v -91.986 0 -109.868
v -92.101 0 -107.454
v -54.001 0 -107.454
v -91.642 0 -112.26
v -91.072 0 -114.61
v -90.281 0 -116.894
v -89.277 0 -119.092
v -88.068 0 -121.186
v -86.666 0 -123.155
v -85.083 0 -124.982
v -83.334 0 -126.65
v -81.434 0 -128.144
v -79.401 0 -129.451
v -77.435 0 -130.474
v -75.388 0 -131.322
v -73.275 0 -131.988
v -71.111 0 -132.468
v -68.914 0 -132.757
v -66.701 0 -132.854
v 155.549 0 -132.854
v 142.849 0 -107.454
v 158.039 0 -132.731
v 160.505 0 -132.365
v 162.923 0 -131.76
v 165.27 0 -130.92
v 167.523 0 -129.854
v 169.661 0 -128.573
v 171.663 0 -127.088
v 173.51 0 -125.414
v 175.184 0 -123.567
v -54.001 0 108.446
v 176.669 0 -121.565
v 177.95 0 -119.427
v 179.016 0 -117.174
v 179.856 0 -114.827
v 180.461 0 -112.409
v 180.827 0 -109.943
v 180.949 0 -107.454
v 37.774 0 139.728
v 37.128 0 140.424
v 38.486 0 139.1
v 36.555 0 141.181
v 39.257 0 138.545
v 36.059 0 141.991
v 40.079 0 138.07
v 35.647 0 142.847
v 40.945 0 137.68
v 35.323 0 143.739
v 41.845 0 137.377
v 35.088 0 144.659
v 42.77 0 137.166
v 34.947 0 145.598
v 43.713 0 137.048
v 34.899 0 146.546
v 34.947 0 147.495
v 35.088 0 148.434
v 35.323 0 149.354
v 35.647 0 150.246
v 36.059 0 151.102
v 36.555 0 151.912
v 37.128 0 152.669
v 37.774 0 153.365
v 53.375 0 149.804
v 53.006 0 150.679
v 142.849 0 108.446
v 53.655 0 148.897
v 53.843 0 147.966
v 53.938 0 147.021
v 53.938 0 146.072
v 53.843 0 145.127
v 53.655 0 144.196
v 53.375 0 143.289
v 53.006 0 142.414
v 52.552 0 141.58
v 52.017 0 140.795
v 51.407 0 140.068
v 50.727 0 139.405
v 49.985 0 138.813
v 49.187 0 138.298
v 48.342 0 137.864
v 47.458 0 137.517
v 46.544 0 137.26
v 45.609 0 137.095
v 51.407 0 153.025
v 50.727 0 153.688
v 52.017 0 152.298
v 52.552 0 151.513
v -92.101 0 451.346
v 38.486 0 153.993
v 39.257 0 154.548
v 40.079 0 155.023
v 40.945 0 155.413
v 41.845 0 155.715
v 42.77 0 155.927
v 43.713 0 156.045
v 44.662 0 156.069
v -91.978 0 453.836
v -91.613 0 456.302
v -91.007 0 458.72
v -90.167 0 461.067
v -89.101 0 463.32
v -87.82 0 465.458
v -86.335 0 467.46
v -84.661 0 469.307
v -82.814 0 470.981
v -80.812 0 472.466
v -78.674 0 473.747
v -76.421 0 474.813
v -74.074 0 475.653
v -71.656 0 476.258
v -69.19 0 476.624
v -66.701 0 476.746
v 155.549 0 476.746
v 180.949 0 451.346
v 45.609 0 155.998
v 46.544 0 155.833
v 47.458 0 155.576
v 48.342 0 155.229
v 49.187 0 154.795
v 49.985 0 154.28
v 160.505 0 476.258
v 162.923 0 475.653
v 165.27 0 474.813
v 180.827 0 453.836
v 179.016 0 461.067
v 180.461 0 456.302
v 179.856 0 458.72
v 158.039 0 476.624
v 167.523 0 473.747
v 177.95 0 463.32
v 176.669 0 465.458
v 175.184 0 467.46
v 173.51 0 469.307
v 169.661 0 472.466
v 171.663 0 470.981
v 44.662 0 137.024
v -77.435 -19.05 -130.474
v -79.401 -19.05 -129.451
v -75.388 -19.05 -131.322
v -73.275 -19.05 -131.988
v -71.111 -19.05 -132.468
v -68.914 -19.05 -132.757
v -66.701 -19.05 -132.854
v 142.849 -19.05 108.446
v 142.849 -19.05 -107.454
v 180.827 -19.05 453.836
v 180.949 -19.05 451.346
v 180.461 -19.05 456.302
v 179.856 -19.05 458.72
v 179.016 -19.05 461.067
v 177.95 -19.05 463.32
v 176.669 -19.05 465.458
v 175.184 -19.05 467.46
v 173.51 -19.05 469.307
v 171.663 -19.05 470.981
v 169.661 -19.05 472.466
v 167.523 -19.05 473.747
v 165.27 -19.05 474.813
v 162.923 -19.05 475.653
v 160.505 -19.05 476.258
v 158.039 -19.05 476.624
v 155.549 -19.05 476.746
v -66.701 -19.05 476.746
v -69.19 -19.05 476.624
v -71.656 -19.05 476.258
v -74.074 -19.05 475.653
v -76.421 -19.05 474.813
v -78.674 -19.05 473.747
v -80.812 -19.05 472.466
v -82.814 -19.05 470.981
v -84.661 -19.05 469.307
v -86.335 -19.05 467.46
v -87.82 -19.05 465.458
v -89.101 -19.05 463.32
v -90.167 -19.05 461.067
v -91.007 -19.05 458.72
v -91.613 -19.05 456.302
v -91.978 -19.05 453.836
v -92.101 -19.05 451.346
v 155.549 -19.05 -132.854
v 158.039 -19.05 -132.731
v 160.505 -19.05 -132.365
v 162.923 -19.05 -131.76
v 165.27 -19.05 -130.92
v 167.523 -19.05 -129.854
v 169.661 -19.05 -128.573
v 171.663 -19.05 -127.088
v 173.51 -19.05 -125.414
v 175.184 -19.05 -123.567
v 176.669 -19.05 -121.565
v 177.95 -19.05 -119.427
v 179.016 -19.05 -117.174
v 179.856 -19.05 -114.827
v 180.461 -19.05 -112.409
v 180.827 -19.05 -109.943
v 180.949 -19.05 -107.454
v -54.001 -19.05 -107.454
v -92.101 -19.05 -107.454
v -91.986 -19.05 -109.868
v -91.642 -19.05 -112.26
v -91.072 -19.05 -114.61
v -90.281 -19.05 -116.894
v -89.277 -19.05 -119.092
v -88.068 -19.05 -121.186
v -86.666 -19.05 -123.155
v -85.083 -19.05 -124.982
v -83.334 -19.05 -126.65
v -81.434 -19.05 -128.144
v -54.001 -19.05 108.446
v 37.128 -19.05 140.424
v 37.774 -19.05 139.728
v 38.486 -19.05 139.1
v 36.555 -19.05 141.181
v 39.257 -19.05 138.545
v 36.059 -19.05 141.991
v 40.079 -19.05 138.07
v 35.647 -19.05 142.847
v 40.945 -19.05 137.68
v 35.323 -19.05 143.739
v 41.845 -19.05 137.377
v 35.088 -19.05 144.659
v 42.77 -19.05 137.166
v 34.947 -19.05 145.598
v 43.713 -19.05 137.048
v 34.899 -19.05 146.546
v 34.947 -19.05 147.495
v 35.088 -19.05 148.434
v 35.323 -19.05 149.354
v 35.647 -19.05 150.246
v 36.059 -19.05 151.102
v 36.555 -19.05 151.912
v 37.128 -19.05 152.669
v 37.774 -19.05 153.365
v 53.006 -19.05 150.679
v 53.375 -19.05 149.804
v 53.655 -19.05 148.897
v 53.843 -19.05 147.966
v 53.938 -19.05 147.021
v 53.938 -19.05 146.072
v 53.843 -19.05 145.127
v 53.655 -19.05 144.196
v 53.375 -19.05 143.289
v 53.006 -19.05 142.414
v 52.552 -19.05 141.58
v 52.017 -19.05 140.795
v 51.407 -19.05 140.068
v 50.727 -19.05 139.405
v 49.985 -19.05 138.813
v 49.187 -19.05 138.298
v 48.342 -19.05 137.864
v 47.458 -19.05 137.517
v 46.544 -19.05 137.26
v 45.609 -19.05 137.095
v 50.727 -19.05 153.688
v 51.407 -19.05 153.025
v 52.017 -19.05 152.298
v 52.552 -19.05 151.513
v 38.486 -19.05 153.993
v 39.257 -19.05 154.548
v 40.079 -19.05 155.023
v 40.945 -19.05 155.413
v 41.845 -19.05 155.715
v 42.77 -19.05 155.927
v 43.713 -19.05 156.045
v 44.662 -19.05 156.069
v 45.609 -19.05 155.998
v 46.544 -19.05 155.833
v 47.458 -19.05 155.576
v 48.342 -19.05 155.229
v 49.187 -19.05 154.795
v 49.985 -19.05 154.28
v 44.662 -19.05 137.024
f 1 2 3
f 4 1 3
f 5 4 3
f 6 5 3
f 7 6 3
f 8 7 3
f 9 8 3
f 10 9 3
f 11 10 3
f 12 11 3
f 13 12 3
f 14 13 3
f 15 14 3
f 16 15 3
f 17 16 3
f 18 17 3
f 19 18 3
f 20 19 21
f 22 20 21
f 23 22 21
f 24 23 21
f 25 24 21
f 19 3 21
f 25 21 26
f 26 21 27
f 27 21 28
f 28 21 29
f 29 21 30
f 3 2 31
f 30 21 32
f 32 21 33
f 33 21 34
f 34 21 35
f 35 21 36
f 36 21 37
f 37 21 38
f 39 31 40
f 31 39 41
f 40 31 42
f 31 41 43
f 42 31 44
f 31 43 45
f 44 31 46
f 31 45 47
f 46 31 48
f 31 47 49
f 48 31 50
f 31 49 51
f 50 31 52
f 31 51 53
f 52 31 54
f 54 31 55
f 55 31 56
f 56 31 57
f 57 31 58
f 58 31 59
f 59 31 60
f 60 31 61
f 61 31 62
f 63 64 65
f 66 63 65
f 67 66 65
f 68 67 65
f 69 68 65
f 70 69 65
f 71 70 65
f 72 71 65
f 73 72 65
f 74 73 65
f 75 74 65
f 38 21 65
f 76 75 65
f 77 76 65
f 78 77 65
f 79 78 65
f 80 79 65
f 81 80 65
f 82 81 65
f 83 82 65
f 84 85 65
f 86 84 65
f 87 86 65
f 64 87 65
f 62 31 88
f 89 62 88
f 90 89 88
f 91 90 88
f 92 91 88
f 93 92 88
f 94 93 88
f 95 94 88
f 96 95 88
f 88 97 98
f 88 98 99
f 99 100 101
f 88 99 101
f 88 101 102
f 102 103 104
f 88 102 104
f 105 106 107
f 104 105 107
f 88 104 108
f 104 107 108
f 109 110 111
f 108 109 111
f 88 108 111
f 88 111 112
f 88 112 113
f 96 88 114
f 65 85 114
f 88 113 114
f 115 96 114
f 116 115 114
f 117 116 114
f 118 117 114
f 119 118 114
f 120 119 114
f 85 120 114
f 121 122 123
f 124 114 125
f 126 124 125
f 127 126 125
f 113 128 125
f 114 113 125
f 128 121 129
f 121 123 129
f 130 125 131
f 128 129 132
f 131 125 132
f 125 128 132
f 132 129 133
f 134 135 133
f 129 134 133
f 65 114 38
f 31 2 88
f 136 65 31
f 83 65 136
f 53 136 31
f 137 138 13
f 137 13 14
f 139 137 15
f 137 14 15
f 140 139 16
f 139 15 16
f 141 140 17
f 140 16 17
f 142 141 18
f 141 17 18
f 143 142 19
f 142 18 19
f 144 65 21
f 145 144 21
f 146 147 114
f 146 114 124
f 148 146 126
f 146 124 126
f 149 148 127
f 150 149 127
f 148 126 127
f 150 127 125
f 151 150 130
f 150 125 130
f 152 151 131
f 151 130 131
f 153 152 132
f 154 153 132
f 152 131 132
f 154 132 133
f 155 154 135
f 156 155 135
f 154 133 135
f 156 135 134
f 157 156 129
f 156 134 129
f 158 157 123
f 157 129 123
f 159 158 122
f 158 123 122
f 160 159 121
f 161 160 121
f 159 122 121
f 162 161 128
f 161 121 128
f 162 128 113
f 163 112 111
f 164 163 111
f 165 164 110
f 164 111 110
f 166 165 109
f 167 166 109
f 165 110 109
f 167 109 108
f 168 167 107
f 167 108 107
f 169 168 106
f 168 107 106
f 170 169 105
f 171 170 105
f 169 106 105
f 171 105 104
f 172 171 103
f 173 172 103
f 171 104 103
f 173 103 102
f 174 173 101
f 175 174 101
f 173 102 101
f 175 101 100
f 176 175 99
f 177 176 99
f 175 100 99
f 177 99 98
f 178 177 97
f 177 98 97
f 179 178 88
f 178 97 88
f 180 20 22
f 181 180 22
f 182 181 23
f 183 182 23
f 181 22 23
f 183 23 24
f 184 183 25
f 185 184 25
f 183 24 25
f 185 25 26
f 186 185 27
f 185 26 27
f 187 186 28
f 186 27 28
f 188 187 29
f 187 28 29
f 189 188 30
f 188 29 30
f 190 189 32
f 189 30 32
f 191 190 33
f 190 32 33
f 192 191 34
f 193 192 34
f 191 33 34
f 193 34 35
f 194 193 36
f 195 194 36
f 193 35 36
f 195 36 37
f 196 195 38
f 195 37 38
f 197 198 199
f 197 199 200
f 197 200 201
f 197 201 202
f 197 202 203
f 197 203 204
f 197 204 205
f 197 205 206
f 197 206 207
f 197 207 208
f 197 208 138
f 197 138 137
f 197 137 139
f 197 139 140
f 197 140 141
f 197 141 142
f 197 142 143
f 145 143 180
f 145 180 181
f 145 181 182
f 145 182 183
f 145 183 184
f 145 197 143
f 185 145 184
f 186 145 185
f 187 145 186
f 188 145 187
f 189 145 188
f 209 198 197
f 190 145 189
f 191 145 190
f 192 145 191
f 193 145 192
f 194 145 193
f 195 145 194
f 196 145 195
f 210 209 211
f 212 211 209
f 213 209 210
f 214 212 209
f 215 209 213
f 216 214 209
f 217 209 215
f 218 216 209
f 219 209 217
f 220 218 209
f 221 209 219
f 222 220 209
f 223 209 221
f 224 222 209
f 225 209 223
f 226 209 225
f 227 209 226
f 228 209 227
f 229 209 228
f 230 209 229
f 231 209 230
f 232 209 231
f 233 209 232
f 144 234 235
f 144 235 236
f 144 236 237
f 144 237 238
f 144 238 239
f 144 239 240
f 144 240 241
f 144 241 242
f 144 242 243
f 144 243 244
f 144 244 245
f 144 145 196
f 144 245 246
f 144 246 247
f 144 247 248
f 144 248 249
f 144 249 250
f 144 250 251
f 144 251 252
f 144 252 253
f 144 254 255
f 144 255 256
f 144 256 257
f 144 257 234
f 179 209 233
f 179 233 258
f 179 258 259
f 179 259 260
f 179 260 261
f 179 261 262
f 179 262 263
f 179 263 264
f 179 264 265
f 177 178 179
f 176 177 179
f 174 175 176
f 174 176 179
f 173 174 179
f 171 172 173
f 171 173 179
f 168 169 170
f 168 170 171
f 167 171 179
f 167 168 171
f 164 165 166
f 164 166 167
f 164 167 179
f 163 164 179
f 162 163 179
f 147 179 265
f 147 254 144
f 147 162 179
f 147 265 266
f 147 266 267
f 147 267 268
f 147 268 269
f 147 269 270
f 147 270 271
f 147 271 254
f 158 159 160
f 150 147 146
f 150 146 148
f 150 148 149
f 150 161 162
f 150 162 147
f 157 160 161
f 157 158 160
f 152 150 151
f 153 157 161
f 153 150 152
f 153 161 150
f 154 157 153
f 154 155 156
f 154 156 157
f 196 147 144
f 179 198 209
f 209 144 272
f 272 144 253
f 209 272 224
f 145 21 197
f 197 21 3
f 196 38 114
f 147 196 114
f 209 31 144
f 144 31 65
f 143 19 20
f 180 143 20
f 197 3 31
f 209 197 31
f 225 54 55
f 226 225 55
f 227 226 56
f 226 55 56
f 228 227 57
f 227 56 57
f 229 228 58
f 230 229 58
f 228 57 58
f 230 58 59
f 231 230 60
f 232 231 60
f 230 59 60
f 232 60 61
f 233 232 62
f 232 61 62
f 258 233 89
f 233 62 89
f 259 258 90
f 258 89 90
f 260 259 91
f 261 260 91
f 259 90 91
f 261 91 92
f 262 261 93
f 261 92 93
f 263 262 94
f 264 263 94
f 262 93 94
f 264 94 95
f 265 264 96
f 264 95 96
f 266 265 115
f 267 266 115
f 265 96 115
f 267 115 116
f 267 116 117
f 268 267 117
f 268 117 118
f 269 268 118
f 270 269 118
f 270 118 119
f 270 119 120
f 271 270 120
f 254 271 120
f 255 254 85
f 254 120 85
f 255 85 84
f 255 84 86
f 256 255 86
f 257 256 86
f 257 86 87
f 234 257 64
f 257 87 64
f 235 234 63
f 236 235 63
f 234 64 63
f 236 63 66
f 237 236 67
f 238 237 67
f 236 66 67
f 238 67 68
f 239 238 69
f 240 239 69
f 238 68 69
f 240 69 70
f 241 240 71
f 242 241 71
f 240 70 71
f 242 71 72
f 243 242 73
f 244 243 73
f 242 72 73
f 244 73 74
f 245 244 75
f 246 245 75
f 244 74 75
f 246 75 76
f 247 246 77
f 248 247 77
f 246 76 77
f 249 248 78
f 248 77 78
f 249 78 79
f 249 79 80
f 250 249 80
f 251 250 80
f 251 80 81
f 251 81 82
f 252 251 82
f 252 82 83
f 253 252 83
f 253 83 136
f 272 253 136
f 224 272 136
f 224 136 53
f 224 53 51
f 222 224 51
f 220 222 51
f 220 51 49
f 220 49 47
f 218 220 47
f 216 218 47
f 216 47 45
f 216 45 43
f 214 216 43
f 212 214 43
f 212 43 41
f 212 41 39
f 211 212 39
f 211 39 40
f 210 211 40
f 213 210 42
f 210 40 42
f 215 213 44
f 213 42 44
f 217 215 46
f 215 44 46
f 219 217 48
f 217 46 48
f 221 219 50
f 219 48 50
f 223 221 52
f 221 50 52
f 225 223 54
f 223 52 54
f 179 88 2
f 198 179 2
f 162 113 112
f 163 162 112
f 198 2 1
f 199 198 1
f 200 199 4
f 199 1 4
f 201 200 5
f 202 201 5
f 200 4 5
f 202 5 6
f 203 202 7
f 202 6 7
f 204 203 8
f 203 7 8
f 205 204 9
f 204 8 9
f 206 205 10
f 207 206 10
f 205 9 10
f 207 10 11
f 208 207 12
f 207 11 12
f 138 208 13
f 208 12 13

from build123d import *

# Parameters (mm, degrees)
F0_W     = 25.4
F0_H     = 163.656833449
F0_W_2   = 136.525
F0_H_2   = 46.7590987682
F1_DEPTH = 19.05


with BuildPart() as f1:
    # F0 (on Front) → F1 (new body)
    with BuildSketch(Plane.XZ):
        with Locations((-79.4005683911, 253.7749098346)):
            Rectangle(F0_W, F0_H)
        Polygon((-66.7005683911, 171.9464931101), (-92.1005683911, 171.9464931101), (-92.1005683911, 146.5464931101), (-79.4005683911, 146.5464931101), (-79.4005683911, -12.6218702644), (-54.0005683911, -12.6218702644), (-54.0005683911, 108.4464931101), (142.8494316089, 108.4464931101), (142.8494316089, -107.4535068899), (180.9494316089, -107.4535068899), (180.9494316089, 171.9464931101), (180.9494316089, 288.8442277908), (44.4244316089, 288.8442277908), (44.4244316089, 335.6033265591), (-66.7005683911, 335.6033265591), align=None)
        with BuildLine():
            ThreePointArc((53.9494316089, 146.5464931101), (44.4244316089, 137.0214931101), (34.8994316089, 146.5464931101))
            ThreePointArc((34.8994316089, 146.5464931101), (44.4244316089, 156.0714931101), (53.9494316089, 146.5464931101))
        make_face(mode=Mode.SUBTRACT)
        Polygon((-79.4005683911, 146.5464931101), (-92.1005683911, 146.5464931101), (-92.1005683911, 121.1464931101), (-92.1005683911, -12.6218702644), (-79.4005683911, -12.6218702644), align=None)
        with BuildLine():
            Line((-92.1005683911, 451.3464931101), (-92.1005683911, 335.6033265591))
            Line((-92.1005683911, 335.6033265591), (-66.7005683911, 335.6033265591))
            Line((-66.7005683911, 335.6033265591), (44.4244316089, 335.6033265591))
            Line((44.4244316089, 335.6033265591), (180.9494316089, 335.6033265591))
            Line((180.9494316089, 335.6033265591), (180.9494316089, 451.3464931101))
            ThreePointArc((180.9494316089, 451.3464931101), (173.509943851, 469.3070053522), (155.5494316089, 476.7464931101))
            Line((155.5494316089, 476.7464931101), (-66.7005683911, 476.7464931101))
            ThreePointArc((-66.7005683911, 476.7464931101), (-84.6610806333, 469.3070053522), (-92.1005683911, 451.3464931101))
        make_face()
        with Locations((112.6869316089, 312.2237771749)):
            Rectangle(F0_W_2, F0_H_2)
        with BuildLine():
            Line((-79.4005683911, -12.6218702644), (-92.1005683911, -12.6218702644))
            Line((-92.1005683911, -12.6218702644), (-92.1005683911, -107.4535068899))
            ThreePointArc((-92.1005683911, -107.4535068899), (-88.6976136472, -120.1535068899), (-79.4005683911, -129.4505521461))
            Line((-79.4005683911, -129.4505521461), (-79.4005683911, -12.6218702644))
        make_face()
        with BuildLine():
            Line((-54.0005683911, -12.6218702644), (-79.4005683911, -12.6218702644))
            Line((-79.4005683911, -12.6218702644), (-79.4005683911, -129.4505521461))
            ThreePointArc((-79.4005683911, -129.4505521461), (-73.2745721367, -131.9880228777), (-66.7005683911, -132.8535068899))
            Line((-66.7005683911, -132.8535068899), (39.5014062524, -132.8535068899))
            Line((39.5014062524, -132.8535068899), (39.5014062524, -107.4535068899))
            Line((39.5014062524, -107.4535068899), (-54.0005683911, -107.4535068899))
            Line((-54.0005683911, -107.4535068899), (-54.0005683911, -12.6218702644))
        make_face()
        Polygon((39.5014062524, -107.4535068899), (39.5014062524, -132.8535068899), (104.7494316089, -132.8535068899), (104.7494316089, -107.4535068899), (95.2244316089, -107.4535068899), align=None)
        with BuildLine():
            ThreePointArc((155.5494316089, -132.8535068899), (173.509943851, -125.4140191321), (180.9494316089, -107.4535068899))
            Line((180.9494316089, -107.4535068899), (142.8494316089, -107.4535068899))
            Line((142.8494316089, -107.4535068899), (104.7494316089, -107.4535068899))
            Line((104.7494316089, -107.4535068899), (104.7494316089, -132.8535068899))
            Line((104.7494316089, -132.8535068899), (155.5494316089, -132.8535068899))
        make_face()
    extrude(amount=F1_DEPTH)


solid = f1.part
